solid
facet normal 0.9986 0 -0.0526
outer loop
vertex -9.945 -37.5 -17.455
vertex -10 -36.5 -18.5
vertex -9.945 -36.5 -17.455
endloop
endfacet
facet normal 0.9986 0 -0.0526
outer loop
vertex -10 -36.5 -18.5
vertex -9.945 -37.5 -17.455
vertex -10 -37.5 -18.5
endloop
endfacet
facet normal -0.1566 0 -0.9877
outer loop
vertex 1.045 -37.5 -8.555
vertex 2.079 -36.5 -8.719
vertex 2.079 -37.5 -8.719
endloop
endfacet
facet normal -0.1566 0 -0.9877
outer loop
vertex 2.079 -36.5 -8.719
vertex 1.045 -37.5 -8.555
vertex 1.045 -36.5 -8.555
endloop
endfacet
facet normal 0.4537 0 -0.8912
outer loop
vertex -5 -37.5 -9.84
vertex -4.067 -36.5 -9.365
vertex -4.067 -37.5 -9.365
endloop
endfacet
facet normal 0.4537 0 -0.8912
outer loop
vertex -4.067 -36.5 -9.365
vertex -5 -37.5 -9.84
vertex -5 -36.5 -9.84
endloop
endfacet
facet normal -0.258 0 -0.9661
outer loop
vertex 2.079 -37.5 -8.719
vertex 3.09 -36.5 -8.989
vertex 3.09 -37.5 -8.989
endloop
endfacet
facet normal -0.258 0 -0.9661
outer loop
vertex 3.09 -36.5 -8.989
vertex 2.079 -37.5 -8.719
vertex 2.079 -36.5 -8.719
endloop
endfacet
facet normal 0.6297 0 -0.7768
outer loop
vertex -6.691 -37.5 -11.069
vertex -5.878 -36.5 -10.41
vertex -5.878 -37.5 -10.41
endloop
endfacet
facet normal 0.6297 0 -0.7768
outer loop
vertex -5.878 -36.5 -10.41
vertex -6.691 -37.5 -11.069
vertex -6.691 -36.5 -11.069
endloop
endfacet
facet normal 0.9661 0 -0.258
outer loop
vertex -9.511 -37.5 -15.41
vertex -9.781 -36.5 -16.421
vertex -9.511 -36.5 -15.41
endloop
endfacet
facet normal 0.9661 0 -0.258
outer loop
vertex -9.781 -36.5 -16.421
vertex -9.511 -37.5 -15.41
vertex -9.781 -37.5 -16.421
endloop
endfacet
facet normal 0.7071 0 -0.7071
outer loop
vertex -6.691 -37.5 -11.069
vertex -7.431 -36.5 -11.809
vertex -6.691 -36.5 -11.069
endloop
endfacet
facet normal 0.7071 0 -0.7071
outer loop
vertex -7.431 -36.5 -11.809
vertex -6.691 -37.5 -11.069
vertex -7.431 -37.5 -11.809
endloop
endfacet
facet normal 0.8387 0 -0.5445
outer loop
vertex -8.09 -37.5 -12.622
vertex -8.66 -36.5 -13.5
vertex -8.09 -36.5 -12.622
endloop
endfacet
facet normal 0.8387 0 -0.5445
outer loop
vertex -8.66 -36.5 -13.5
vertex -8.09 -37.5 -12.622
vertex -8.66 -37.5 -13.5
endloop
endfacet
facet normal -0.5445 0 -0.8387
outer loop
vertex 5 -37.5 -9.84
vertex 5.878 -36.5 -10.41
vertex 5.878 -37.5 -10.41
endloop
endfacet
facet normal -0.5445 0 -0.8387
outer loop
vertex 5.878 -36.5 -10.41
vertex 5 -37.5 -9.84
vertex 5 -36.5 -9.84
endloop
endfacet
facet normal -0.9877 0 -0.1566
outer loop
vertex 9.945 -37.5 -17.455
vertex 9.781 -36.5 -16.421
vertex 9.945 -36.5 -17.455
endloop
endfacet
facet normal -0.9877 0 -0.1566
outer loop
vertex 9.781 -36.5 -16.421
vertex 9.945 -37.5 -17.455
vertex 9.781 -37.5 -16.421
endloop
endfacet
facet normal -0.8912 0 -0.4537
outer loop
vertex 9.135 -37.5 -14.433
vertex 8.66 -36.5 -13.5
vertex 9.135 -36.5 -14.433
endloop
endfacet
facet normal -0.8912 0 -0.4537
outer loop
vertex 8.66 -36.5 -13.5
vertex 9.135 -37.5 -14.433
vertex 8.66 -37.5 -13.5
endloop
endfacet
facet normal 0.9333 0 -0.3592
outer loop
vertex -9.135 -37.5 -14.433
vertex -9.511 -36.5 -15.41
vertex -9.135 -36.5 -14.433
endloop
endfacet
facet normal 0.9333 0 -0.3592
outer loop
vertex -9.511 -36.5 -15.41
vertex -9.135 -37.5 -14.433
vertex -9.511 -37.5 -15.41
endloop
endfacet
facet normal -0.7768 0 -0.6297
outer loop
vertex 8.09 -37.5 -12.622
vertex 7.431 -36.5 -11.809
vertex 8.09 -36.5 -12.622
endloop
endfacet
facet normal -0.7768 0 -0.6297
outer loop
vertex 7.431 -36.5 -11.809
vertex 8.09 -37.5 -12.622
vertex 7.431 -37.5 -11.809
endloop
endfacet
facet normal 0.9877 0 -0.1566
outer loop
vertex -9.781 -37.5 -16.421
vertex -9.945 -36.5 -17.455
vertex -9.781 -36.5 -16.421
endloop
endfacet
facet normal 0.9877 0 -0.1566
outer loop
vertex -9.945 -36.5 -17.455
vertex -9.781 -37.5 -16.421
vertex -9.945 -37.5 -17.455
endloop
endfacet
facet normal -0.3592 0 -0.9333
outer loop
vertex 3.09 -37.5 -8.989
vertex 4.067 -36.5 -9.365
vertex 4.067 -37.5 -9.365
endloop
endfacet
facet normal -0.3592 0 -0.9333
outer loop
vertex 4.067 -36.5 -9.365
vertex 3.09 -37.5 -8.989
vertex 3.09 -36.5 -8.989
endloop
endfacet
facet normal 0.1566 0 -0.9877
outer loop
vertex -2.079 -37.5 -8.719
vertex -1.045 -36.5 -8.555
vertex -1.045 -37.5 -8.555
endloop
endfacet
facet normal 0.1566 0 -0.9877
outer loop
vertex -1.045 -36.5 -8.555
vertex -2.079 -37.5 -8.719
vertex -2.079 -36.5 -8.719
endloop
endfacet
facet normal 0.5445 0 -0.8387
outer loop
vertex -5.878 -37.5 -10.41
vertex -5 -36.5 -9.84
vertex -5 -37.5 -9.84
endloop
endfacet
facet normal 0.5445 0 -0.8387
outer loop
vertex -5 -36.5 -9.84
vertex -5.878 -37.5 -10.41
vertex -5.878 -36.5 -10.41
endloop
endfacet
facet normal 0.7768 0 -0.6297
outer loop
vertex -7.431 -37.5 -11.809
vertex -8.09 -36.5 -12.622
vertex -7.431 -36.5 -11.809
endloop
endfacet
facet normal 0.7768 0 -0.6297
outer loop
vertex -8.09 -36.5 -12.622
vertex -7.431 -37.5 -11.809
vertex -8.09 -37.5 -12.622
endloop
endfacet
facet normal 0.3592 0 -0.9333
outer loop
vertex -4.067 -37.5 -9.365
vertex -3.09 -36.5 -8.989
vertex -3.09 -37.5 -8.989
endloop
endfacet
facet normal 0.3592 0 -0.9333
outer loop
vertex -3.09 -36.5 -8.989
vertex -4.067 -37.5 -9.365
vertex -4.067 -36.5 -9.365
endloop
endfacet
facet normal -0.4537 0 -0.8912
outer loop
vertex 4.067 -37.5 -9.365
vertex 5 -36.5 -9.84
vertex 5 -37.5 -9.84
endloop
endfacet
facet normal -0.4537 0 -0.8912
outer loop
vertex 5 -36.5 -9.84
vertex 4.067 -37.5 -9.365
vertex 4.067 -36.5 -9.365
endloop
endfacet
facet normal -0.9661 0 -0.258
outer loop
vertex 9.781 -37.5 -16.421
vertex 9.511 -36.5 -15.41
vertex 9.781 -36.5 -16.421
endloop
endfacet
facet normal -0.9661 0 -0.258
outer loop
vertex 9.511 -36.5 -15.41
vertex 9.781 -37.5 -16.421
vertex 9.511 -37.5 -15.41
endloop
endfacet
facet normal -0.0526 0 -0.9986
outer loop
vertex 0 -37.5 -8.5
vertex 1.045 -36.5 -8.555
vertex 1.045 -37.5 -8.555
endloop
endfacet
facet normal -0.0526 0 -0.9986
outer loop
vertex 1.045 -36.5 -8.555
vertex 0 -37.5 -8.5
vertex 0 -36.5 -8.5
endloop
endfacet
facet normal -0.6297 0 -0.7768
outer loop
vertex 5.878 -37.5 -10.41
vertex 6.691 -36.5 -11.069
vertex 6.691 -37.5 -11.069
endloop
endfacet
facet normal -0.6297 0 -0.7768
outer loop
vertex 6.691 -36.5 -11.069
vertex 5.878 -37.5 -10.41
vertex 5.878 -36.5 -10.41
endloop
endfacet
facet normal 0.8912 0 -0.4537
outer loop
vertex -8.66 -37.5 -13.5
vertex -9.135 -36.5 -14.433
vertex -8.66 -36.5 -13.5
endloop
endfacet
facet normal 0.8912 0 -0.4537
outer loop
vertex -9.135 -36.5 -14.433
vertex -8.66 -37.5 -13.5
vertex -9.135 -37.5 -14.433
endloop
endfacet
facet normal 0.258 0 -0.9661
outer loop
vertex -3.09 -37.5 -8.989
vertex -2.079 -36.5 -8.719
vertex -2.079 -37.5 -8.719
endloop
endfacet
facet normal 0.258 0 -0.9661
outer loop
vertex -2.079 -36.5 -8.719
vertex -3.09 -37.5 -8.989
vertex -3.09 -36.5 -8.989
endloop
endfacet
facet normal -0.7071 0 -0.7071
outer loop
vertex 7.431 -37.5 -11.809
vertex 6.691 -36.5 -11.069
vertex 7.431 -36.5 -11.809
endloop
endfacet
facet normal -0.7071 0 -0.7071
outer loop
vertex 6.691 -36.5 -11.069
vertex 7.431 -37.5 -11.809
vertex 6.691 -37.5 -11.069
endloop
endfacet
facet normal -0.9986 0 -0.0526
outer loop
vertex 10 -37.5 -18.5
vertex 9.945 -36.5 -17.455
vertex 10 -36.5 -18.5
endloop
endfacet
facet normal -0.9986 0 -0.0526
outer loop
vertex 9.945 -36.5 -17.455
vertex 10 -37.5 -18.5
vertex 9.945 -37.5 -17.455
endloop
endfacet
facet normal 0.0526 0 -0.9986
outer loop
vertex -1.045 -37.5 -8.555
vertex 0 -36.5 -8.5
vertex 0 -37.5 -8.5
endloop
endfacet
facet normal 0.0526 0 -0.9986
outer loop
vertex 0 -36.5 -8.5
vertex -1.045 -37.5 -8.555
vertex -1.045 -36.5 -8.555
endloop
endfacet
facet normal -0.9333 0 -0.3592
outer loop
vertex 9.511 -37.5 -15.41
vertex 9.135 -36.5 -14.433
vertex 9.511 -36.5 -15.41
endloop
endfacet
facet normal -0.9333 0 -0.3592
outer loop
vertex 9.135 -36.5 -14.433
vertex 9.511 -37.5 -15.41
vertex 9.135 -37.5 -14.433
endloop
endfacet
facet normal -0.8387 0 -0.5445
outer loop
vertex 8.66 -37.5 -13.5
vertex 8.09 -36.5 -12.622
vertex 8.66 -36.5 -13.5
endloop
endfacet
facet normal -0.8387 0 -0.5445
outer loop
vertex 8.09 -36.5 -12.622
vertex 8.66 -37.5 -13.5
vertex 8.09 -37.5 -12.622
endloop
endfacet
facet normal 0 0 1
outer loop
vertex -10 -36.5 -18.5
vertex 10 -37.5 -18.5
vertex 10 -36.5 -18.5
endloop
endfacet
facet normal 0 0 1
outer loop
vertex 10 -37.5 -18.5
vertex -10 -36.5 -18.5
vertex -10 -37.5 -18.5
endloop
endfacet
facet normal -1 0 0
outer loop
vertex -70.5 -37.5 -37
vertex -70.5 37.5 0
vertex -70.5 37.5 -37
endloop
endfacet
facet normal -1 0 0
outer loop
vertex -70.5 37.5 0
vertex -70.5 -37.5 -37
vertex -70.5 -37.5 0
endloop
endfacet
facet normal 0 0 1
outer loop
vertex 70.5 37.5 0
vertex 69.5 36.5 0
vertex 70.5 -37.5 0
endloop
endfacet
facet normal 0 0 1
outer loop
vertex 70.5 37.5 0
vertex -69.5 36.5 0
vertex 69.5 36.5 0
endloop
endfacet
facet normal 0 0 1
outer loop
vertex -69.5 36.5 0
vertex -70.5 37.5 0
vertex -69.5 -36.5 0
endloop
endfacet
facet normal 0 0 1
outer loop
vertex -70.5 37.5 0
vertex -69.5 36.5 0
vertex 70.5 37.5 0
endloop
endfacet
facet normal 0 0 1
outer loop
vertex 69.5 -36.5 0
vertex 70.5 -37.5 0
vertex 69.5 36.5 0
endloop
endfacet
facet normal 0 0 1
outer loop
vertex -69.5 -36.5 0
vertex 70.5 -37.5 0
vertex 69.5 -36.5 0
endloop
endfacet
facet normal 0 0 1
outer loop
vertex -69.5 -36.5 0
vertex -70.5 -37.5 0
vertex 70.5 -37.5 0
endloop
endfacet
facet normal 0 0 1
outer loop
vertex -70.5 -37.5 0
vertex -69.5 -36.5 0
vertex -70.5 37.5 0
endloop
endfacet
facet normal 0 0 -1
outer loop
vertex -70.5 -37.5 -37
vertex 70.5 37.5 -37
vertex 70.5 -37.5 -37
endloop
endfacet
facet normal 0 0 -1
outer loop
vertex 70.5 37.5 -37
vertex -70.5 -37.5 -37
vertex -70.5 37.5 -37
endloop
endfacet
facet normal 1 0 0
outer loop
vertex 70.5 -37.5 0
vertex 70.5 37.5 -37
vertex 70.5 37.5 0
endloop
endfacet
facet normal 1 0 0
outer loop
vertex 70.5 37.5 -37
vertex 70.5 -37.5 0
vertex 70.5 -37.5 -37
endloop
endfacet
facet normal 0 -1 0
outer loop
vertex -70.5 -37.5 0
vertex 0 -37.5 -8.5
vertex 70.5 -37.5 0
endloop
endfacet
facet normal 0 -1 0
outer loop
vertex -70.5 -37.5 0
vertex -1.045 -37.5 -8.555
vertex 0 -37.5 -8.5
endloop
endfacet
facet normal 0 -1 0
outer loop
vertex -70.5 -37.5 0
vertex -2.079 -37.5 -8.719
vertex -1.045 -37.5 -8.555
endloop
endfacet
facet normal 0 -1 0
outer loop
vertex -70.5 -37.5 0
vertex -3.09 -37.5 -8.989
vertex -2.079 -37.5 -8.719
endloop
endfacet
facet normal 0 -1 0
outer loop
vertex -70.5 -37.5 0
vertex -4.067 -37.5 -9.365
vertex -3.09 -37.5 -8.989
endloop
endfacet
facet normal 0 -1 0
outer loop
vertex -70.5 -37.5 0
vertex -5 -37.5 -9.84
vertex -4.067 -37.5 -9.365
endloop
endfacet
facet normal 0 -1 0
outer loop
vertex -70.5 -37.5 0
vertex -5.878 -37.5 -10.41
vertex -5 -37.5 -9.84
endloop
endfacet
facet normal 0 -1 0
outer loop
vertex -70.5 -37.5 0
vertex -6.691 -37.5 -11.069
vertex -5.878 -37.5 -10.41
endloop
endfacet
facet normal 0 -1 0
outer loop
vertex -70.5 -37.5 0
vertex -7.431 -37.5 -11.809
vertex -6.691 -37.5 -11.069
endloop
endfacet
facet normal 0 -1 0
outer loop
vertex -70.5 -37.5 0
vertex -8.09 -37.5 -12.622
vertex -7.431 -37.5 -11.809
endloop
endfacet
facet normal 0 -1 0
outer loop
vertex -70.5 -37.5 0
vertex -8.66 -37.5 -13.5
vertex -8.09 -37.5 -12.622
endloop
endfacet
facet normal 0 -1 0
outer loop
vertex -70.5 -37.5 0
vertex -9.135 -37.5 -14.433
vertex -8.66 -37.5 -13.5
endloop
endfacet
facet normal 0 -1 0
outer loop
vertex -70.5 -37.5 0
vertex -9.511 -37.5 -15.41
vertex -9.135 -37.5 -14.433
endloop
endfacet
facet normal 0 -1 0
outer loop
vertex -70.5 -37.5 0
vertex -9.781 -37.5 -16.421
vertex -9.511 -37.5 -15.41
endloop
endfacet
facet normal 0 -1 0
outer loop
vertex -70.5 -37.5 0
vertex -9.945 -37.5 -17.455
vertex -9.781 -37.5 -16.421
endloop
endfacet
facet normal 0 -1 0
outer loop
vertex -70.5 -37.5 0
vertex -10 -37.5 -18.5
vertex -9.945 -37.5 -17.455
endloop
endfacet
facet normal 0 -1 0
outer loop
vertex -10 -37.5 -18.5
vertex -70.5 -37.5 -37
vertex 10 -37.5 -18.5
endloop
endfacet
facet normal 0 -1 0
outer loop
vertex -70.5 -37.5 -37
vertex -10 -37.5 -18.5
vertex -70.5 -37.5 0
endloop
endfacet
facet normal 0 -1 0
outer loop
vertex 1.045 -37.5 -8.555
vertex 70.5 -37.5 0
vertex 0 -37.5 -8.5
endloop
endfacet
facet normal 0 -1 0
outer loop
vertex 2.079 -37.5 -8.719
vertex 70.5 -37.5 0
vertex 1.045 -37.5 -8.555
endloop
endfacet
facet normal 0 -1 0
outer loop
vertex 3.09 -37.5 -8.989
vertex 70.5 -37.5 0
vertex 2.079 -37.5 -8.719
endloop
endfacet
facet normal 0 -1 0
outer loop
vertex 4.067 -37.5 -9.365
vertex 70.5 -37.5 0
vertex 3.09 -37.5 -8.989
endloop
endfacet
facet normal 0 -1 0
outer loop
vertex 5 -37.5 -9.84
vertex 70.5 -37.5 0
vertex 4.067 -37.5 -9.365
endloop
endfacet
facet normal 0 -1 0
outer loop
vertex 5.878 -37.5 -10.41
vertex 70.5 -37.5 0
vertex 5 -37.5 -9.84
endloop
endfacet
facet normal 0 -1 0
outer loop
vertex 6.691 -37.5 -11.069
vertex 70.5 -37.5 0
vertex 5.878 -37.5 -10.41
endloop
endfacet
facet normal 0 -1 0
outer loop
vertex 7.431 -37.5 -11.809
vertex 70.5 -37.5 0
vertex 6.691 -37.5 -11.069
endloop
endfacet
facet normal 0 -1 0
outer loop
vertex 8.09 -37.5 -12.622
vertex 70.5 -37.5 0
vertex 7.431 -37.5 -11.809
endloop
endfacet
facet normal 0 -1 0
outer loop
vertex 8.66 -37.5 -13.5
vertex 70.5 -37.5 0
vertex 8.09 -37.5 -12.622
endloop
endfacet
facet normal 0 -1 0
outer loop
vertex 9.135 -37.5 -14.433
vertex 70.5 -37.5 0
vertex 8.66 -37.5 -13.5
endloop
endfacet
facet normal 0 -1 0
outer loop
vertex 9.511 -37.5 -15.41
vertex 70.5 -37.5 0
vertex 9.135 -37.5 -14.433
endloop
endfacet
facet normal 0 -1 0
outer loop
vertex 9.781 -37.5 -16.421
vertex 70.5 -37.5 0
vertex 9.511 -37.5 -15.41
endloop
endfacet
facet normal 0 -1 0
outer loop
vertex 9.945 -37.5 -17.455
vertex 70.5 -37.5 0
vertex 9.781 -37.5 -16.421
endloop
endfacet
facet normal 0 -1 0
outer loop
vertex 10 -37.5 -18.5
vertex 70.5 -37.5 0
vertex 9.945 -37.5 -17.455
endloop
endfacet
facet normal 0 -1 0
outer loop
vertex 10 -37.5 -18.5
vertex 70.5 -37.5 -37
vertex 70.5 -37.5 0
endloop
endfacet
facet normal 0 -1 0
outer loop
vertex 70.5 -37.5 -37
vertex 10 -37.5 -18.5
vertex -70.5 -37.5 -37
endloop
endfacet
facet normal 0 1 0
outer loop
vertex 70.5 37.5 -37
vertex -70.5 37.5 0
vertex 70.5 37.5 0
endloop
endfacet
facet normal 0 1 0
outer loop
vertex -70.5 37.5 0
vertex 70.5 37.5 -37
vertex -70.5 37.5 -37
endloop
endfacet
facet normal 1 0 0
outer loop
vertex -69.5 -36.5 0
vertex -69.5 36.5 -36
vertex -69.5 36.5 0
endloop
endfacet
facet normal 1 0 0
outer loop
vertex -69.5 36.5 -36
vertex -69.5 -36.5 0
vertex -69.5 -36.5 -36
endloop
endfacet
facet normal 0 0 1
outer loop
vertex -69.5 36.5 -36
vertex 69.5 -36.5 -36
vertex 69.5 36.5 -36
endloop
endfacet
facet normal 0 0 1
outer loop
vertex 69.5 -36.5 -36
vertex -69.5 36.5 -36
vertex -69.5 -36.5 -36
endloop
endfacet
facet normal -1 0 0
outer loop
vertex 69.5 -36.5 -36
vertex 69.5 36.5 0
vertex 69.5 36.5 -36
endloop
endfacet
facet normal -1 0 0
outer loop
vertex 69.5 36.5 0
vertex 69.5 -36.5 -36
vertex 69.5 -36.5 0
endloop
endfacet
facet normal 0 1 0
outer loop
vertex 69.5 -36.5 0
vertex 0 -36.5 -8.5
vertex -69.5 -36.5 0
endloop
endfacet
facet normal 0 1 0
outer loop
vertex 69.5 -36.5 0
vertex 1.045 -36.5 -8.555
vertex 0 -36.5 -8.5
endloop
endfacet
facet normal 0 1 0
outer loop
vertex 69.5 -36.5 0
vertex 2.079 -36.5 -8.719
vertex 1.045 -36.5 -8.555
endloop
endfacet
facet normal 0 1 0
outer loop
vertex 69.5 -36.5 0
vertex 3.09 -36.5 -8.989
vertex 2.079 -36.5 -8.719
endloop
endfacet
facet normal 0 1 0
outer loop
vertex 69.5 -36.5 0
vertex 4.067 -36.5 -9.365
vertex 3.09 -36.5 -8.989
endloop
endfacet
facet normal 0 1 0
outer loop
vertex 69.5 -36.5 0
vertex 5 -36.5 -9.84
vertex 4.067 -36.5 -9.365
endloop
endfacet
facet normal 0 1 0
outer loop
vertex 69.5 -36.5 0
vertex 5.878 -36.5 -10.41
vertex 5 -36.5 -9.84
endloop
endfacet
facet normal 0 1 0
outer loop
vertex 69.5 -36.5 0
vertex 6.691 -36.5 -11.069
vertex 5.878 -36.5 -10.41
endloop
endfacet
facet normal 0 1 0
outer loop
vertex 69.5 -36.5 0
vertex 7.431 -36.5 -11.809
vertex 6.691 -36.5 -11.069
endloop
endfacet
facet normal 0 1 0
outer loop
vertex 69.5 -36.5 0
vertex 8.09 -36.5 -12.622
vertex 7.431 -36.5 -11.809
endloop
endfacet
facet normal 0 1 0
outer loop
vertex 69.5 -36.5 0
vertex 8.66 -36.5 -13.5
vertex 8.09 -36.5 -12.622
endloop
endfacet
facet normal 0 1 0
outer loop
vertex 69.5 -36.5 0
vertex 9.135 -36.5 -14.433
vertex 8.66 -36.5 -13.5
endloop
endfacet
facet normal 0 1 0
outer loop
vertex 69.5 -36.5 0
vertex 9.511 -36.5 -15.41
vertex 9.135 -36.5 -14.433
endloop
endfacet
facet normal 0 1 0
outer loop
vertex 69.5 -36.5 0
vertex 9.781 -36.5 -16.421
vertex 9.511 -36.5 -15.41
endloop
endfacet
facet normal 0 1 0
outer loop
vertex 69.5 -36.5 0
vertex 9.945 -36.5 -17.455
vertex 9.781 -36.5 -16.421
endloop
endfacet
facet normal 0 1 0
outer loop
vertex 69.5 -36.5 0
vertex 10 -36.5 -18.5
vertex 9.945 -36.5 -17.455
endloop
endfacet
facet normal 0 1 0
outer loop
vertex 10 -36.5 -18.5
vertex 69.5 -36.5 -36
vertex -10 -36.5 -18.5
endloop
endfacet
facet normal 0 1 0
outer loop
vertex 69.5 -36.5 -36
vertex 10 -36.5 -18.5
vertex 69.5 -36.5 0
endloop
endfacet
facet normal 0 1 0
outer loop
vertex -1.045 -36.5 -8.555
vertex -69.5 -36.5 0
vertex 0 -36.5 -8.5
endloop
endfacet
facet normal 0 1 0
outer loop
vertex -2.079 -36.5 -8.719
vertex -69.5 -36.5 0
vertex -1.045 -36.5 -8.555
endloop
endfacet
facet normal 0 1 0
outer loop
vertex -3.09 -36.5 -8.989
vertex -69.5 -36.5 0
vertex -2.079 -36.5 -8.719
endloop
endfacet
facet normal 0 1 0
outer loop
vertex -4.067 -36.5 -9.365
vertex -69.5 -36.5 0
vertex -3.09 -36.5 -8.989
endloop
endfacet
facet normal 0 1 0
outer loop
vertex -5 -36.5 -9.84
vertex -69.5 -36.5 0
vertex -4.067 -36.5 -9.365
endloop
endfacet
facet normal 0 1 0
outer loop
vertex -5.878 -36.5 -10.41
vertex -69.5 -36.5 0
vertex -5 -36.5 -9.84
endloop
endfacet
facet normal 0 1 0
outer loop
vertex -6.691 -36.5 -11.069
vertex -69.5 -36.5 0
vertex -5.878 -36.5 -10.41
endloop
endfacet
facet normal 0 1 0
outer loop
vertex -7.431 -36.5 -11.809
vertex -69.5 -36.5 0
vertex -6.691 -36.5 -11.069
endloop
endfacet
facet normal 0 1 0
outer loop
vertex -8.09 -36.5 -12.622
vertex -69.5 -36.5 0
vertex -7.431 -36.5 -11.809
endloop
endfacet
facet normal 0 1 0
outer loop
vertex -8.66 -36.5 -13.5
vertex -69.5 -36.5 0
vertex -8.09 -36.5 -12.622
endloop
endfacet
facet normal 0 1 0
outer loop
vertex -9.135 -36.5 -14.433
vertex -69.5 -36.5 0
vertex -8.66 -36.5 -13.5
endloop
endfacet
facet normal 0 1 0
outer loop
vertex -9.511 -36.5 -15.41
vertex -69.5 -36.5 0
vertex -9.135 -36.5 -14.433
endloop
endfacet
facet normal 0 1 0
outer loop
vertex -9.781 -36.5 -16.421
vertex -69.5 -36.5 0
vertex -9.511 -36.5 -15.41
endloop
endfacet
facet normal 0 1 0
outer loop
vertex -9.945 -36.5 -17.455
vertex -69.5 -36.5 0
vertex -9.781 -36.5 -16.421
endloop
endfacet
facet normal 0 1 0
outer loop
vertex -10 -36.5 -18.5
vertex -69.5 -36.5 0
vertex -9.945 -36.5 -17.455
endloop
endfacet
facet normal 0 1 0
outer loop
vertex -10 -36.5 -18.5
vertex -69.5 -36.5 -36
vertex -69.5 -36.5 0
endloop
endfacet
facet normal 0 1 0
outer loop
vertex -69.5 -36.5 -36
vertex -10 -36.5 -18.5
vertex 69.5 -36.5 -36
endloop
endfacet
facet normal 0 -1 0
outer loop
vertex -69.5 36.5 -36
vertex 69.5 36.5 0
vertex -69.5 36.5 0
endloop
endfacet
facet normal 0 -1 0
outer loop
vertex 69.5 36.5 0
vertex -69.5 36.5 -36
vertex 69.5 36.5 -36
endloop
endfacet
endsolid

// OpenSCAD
/***********************************************************************
Name ......... : pcBayDrawer.scad
Description....: 5.25" PC Bay Drawer
Author ....... : Garrett Melenka
Version ...... : V1.0 2016/07/10
Licence ...... : GPL
***********************************************************************/
//Part Display Options 
part = 1;//[0:All, 1:drawer, 2: Pc mount]

//Dimensions measured from Antec 300 PC Case
//width of drawer mount bracket
x=146;
//length of drawer mount bracket[50:5:150]
y=80;
//height of drawer mount bracket
z=42;  

//thickness of drawer mount walls
mountWallThickness = 4; 
//Add tolerance to bin dimensions so it slides easily into the mount
drawerTolerance = 1;

//Dimensions of Drawer
//Width of drawer
width = x-mountWallThickness-drawerTolerance;
//Height of Drawer
height = z-mountWallThickness-drawerTolerance;
//Length of Drawer
length = y-mountWallThickness-drawerTolerance;
//specify thickness of drawer walls
wallThickness = 2; 

//mounting screws to connect the drawer mount to ATX case
//diameter of mounting screw
mountScrewDiameter = 2.75; 
//depth of mounting screw
mountScrewLength = 5; 
//number of screws to add to the drawer mount bracket
mountHoles = 2; 

//Tab Option
tabOption = 3; //[0:tab, 1:handle, 2:knob, 3: half circle hole, 4: No Tab / Handle]
//Thickness of Tab/ handle
tabThickness = 5;
//Radius of Tab / handle
tabRadius = 30;
//Depth of tab/ handle
tabDepth = 10;
// knob diameter if tabOption == 2
knobDiameter = 20; 
// hole diameter if tabOption == 3
holeDiameter = 20;
// Drawer Face Option 
drawerFaceOption = 0; //[0:No pattern on drawer face, 1:pattern on drawer face]
//spacing for front face pattern
frontSpacing = 5;
//diameter of front face pattern
frontDesignDiameter = 2;
//depth of front face pattern
frontDesignDepth = 2;



//Drawer for PC Case
module pcBayDrawer()
{
    union()
    {
    difference()
    {
    translate([0,0,-height*0.5]){
    cube(size = [width, length, height], center = true);
    }
    
    translate([0,0,-(height-wallThickness)*0.5]){
    cube(size = [width-wallThickness, length-wallThickness, height], center = true);
    }
    
    if(drawerFaceOption ==1)
    {
    for (j = [-height:frontSpacing:height]){
    for (i = [-width:frontSpacing:width])
    {
    
    translate([i,length*0.5+0.5, -2+j])
    {
    rotate([90,0,0])
    {
    cylinder(h = frontDesignDepth, r = frontDesignDiameter*0.5, center = true);
    }
    }
    }
    }
    }
    // hole option
    if (tabOption ==3)
    {
        translate([0,length*0.5, -height*0.5])
        {
        rotate([90, 90, 0])
        {
        
        difference(){
        cylinder(h = wallThickness*2, r = holeDiameter*0.5, center = true);
        
        translate([holeDiameter*0.5, 0, 0]){
        cube(size = [holeDiameter, holeDiameter, wallThickness*2], center = true);
        }
        
        }
        }
        }
        }
    }
    
    
    
    // Drawer Tab Option
    if (tabOption ==0){
    translate([0, length*0.5+tabDepth*0.5, -height*0.5])
    {
    union()
    {    
    cube(size = [tabDepth*2,tabDepth,tabThickness], center = true);
    
    translate([0,tabDepth*0.5,0]){  
    cylinder(h=tabThickness, r=tabDepth, center = true);
    }
    }
    }
    }
    
    //Drawer Handle Option
    if (tabOption == 1)
    {
       
       translate([0,length*0.5,-height*0.5])
       { 
        
       difference(){
       cylinder(h = tabDepth, r = tabRadius, center = true);
           
       cylinder(h = tabDepth, r = tabRadius-tabThickness, center = true);
       
        
       translate([0,-tabRadius*0.5,0])
       {
       cube(size = [tabRadius*2, tabRadius, tabDepth], center = true); 
       }
        }
    }
        
    }
    
    
    //Drawer Knob Option
    if (tabOption ==2)
    {
        
        
        translate([0,length*0.5+tabDepth*0.5,-height*0.5])
        {
        rotate([-90,0,0])
        {
        hull(){
        cylinder(h = tabDepth, r=knobDiameter*0.5, center = true);
        
        translate([0,0,tabDepth]){
        cylinder(h = tabDepth, r=knobDiameter*0.5+5, center = true);
        }
        }
        }
        }
        
        
        }
    
    
    }
    
    
}
//Mount for PC Case
module pcBayMount()
{
    difference()
    {
    cube(size = [x, y, z], center = true);
    translate([0,(y-length)*0.5,0]){
    cube(size = [x-mountWallThickness, y-mountWallThickness, z-mountWallThickness], center = true);
    }
    
    
    
    mountHoleSpacing = (y-20) / mountHoles;
    echo(mountHoleSpacing);
    
    //for(i = [(-y*0.5 + 10):mountHoleSpacing:(y*0.5-10)])
    for(i = [-mountHoles:1:mountHoles])    
    {
    
    translate([x*0.5-mountScrewLength*0.5, i*mountHoleSpacing, -height*0.25]){
    rotate([0,90,0]){
    cylinder(h=mountScrewLength, r = mountScrewDiameter*0.5, center = true);
    }
    }
    
    translate([x*0.5-mountScrewLength*0.5, i*mountHoleSpacing, height*0.25]){
    rotate([0,90,0]){
    cylinder(h=mountScrewLength, r = mountScrewDiameter*0.5, center = true);
    }
    }
    
    
    translate([-x*0.5+mountScrewLength*0.5, i*mountHoleSpacing, -height*0.25]){
    rotate([0,90,0]){
    cylinder(h=mountScrewLength, r = mountScrewDiameter*0.5, center = true);
    }
    }
    
    translate([-x*0.5+mountScrewLength*0.5, i*mountHoleSpacing, height*0.25]){
    rotate([0,90,0]){
    cylinder(h=mountScrewLength, r = mountScrewDiameter*0.5, center = true);
    }
    }
    
    }
    }
    
    
    
}


// Display Drawer and Mount
if (part == 0){

$fn = 60;
color("green")
translate([0,0,height*0.5]){
pcBayDrawer();
}



%pcBayMount();
}

// Display Drawer
if (part == 1)
{
    $fn = 60;
color("green")
//translate([0,20,height*0.5])
rotate([0,0,180])   
    {
pcBayDrawer();
}
}
// Display Mount
if (part == 2)
{
  $fn = 60;
  pcBayMount();  
}
